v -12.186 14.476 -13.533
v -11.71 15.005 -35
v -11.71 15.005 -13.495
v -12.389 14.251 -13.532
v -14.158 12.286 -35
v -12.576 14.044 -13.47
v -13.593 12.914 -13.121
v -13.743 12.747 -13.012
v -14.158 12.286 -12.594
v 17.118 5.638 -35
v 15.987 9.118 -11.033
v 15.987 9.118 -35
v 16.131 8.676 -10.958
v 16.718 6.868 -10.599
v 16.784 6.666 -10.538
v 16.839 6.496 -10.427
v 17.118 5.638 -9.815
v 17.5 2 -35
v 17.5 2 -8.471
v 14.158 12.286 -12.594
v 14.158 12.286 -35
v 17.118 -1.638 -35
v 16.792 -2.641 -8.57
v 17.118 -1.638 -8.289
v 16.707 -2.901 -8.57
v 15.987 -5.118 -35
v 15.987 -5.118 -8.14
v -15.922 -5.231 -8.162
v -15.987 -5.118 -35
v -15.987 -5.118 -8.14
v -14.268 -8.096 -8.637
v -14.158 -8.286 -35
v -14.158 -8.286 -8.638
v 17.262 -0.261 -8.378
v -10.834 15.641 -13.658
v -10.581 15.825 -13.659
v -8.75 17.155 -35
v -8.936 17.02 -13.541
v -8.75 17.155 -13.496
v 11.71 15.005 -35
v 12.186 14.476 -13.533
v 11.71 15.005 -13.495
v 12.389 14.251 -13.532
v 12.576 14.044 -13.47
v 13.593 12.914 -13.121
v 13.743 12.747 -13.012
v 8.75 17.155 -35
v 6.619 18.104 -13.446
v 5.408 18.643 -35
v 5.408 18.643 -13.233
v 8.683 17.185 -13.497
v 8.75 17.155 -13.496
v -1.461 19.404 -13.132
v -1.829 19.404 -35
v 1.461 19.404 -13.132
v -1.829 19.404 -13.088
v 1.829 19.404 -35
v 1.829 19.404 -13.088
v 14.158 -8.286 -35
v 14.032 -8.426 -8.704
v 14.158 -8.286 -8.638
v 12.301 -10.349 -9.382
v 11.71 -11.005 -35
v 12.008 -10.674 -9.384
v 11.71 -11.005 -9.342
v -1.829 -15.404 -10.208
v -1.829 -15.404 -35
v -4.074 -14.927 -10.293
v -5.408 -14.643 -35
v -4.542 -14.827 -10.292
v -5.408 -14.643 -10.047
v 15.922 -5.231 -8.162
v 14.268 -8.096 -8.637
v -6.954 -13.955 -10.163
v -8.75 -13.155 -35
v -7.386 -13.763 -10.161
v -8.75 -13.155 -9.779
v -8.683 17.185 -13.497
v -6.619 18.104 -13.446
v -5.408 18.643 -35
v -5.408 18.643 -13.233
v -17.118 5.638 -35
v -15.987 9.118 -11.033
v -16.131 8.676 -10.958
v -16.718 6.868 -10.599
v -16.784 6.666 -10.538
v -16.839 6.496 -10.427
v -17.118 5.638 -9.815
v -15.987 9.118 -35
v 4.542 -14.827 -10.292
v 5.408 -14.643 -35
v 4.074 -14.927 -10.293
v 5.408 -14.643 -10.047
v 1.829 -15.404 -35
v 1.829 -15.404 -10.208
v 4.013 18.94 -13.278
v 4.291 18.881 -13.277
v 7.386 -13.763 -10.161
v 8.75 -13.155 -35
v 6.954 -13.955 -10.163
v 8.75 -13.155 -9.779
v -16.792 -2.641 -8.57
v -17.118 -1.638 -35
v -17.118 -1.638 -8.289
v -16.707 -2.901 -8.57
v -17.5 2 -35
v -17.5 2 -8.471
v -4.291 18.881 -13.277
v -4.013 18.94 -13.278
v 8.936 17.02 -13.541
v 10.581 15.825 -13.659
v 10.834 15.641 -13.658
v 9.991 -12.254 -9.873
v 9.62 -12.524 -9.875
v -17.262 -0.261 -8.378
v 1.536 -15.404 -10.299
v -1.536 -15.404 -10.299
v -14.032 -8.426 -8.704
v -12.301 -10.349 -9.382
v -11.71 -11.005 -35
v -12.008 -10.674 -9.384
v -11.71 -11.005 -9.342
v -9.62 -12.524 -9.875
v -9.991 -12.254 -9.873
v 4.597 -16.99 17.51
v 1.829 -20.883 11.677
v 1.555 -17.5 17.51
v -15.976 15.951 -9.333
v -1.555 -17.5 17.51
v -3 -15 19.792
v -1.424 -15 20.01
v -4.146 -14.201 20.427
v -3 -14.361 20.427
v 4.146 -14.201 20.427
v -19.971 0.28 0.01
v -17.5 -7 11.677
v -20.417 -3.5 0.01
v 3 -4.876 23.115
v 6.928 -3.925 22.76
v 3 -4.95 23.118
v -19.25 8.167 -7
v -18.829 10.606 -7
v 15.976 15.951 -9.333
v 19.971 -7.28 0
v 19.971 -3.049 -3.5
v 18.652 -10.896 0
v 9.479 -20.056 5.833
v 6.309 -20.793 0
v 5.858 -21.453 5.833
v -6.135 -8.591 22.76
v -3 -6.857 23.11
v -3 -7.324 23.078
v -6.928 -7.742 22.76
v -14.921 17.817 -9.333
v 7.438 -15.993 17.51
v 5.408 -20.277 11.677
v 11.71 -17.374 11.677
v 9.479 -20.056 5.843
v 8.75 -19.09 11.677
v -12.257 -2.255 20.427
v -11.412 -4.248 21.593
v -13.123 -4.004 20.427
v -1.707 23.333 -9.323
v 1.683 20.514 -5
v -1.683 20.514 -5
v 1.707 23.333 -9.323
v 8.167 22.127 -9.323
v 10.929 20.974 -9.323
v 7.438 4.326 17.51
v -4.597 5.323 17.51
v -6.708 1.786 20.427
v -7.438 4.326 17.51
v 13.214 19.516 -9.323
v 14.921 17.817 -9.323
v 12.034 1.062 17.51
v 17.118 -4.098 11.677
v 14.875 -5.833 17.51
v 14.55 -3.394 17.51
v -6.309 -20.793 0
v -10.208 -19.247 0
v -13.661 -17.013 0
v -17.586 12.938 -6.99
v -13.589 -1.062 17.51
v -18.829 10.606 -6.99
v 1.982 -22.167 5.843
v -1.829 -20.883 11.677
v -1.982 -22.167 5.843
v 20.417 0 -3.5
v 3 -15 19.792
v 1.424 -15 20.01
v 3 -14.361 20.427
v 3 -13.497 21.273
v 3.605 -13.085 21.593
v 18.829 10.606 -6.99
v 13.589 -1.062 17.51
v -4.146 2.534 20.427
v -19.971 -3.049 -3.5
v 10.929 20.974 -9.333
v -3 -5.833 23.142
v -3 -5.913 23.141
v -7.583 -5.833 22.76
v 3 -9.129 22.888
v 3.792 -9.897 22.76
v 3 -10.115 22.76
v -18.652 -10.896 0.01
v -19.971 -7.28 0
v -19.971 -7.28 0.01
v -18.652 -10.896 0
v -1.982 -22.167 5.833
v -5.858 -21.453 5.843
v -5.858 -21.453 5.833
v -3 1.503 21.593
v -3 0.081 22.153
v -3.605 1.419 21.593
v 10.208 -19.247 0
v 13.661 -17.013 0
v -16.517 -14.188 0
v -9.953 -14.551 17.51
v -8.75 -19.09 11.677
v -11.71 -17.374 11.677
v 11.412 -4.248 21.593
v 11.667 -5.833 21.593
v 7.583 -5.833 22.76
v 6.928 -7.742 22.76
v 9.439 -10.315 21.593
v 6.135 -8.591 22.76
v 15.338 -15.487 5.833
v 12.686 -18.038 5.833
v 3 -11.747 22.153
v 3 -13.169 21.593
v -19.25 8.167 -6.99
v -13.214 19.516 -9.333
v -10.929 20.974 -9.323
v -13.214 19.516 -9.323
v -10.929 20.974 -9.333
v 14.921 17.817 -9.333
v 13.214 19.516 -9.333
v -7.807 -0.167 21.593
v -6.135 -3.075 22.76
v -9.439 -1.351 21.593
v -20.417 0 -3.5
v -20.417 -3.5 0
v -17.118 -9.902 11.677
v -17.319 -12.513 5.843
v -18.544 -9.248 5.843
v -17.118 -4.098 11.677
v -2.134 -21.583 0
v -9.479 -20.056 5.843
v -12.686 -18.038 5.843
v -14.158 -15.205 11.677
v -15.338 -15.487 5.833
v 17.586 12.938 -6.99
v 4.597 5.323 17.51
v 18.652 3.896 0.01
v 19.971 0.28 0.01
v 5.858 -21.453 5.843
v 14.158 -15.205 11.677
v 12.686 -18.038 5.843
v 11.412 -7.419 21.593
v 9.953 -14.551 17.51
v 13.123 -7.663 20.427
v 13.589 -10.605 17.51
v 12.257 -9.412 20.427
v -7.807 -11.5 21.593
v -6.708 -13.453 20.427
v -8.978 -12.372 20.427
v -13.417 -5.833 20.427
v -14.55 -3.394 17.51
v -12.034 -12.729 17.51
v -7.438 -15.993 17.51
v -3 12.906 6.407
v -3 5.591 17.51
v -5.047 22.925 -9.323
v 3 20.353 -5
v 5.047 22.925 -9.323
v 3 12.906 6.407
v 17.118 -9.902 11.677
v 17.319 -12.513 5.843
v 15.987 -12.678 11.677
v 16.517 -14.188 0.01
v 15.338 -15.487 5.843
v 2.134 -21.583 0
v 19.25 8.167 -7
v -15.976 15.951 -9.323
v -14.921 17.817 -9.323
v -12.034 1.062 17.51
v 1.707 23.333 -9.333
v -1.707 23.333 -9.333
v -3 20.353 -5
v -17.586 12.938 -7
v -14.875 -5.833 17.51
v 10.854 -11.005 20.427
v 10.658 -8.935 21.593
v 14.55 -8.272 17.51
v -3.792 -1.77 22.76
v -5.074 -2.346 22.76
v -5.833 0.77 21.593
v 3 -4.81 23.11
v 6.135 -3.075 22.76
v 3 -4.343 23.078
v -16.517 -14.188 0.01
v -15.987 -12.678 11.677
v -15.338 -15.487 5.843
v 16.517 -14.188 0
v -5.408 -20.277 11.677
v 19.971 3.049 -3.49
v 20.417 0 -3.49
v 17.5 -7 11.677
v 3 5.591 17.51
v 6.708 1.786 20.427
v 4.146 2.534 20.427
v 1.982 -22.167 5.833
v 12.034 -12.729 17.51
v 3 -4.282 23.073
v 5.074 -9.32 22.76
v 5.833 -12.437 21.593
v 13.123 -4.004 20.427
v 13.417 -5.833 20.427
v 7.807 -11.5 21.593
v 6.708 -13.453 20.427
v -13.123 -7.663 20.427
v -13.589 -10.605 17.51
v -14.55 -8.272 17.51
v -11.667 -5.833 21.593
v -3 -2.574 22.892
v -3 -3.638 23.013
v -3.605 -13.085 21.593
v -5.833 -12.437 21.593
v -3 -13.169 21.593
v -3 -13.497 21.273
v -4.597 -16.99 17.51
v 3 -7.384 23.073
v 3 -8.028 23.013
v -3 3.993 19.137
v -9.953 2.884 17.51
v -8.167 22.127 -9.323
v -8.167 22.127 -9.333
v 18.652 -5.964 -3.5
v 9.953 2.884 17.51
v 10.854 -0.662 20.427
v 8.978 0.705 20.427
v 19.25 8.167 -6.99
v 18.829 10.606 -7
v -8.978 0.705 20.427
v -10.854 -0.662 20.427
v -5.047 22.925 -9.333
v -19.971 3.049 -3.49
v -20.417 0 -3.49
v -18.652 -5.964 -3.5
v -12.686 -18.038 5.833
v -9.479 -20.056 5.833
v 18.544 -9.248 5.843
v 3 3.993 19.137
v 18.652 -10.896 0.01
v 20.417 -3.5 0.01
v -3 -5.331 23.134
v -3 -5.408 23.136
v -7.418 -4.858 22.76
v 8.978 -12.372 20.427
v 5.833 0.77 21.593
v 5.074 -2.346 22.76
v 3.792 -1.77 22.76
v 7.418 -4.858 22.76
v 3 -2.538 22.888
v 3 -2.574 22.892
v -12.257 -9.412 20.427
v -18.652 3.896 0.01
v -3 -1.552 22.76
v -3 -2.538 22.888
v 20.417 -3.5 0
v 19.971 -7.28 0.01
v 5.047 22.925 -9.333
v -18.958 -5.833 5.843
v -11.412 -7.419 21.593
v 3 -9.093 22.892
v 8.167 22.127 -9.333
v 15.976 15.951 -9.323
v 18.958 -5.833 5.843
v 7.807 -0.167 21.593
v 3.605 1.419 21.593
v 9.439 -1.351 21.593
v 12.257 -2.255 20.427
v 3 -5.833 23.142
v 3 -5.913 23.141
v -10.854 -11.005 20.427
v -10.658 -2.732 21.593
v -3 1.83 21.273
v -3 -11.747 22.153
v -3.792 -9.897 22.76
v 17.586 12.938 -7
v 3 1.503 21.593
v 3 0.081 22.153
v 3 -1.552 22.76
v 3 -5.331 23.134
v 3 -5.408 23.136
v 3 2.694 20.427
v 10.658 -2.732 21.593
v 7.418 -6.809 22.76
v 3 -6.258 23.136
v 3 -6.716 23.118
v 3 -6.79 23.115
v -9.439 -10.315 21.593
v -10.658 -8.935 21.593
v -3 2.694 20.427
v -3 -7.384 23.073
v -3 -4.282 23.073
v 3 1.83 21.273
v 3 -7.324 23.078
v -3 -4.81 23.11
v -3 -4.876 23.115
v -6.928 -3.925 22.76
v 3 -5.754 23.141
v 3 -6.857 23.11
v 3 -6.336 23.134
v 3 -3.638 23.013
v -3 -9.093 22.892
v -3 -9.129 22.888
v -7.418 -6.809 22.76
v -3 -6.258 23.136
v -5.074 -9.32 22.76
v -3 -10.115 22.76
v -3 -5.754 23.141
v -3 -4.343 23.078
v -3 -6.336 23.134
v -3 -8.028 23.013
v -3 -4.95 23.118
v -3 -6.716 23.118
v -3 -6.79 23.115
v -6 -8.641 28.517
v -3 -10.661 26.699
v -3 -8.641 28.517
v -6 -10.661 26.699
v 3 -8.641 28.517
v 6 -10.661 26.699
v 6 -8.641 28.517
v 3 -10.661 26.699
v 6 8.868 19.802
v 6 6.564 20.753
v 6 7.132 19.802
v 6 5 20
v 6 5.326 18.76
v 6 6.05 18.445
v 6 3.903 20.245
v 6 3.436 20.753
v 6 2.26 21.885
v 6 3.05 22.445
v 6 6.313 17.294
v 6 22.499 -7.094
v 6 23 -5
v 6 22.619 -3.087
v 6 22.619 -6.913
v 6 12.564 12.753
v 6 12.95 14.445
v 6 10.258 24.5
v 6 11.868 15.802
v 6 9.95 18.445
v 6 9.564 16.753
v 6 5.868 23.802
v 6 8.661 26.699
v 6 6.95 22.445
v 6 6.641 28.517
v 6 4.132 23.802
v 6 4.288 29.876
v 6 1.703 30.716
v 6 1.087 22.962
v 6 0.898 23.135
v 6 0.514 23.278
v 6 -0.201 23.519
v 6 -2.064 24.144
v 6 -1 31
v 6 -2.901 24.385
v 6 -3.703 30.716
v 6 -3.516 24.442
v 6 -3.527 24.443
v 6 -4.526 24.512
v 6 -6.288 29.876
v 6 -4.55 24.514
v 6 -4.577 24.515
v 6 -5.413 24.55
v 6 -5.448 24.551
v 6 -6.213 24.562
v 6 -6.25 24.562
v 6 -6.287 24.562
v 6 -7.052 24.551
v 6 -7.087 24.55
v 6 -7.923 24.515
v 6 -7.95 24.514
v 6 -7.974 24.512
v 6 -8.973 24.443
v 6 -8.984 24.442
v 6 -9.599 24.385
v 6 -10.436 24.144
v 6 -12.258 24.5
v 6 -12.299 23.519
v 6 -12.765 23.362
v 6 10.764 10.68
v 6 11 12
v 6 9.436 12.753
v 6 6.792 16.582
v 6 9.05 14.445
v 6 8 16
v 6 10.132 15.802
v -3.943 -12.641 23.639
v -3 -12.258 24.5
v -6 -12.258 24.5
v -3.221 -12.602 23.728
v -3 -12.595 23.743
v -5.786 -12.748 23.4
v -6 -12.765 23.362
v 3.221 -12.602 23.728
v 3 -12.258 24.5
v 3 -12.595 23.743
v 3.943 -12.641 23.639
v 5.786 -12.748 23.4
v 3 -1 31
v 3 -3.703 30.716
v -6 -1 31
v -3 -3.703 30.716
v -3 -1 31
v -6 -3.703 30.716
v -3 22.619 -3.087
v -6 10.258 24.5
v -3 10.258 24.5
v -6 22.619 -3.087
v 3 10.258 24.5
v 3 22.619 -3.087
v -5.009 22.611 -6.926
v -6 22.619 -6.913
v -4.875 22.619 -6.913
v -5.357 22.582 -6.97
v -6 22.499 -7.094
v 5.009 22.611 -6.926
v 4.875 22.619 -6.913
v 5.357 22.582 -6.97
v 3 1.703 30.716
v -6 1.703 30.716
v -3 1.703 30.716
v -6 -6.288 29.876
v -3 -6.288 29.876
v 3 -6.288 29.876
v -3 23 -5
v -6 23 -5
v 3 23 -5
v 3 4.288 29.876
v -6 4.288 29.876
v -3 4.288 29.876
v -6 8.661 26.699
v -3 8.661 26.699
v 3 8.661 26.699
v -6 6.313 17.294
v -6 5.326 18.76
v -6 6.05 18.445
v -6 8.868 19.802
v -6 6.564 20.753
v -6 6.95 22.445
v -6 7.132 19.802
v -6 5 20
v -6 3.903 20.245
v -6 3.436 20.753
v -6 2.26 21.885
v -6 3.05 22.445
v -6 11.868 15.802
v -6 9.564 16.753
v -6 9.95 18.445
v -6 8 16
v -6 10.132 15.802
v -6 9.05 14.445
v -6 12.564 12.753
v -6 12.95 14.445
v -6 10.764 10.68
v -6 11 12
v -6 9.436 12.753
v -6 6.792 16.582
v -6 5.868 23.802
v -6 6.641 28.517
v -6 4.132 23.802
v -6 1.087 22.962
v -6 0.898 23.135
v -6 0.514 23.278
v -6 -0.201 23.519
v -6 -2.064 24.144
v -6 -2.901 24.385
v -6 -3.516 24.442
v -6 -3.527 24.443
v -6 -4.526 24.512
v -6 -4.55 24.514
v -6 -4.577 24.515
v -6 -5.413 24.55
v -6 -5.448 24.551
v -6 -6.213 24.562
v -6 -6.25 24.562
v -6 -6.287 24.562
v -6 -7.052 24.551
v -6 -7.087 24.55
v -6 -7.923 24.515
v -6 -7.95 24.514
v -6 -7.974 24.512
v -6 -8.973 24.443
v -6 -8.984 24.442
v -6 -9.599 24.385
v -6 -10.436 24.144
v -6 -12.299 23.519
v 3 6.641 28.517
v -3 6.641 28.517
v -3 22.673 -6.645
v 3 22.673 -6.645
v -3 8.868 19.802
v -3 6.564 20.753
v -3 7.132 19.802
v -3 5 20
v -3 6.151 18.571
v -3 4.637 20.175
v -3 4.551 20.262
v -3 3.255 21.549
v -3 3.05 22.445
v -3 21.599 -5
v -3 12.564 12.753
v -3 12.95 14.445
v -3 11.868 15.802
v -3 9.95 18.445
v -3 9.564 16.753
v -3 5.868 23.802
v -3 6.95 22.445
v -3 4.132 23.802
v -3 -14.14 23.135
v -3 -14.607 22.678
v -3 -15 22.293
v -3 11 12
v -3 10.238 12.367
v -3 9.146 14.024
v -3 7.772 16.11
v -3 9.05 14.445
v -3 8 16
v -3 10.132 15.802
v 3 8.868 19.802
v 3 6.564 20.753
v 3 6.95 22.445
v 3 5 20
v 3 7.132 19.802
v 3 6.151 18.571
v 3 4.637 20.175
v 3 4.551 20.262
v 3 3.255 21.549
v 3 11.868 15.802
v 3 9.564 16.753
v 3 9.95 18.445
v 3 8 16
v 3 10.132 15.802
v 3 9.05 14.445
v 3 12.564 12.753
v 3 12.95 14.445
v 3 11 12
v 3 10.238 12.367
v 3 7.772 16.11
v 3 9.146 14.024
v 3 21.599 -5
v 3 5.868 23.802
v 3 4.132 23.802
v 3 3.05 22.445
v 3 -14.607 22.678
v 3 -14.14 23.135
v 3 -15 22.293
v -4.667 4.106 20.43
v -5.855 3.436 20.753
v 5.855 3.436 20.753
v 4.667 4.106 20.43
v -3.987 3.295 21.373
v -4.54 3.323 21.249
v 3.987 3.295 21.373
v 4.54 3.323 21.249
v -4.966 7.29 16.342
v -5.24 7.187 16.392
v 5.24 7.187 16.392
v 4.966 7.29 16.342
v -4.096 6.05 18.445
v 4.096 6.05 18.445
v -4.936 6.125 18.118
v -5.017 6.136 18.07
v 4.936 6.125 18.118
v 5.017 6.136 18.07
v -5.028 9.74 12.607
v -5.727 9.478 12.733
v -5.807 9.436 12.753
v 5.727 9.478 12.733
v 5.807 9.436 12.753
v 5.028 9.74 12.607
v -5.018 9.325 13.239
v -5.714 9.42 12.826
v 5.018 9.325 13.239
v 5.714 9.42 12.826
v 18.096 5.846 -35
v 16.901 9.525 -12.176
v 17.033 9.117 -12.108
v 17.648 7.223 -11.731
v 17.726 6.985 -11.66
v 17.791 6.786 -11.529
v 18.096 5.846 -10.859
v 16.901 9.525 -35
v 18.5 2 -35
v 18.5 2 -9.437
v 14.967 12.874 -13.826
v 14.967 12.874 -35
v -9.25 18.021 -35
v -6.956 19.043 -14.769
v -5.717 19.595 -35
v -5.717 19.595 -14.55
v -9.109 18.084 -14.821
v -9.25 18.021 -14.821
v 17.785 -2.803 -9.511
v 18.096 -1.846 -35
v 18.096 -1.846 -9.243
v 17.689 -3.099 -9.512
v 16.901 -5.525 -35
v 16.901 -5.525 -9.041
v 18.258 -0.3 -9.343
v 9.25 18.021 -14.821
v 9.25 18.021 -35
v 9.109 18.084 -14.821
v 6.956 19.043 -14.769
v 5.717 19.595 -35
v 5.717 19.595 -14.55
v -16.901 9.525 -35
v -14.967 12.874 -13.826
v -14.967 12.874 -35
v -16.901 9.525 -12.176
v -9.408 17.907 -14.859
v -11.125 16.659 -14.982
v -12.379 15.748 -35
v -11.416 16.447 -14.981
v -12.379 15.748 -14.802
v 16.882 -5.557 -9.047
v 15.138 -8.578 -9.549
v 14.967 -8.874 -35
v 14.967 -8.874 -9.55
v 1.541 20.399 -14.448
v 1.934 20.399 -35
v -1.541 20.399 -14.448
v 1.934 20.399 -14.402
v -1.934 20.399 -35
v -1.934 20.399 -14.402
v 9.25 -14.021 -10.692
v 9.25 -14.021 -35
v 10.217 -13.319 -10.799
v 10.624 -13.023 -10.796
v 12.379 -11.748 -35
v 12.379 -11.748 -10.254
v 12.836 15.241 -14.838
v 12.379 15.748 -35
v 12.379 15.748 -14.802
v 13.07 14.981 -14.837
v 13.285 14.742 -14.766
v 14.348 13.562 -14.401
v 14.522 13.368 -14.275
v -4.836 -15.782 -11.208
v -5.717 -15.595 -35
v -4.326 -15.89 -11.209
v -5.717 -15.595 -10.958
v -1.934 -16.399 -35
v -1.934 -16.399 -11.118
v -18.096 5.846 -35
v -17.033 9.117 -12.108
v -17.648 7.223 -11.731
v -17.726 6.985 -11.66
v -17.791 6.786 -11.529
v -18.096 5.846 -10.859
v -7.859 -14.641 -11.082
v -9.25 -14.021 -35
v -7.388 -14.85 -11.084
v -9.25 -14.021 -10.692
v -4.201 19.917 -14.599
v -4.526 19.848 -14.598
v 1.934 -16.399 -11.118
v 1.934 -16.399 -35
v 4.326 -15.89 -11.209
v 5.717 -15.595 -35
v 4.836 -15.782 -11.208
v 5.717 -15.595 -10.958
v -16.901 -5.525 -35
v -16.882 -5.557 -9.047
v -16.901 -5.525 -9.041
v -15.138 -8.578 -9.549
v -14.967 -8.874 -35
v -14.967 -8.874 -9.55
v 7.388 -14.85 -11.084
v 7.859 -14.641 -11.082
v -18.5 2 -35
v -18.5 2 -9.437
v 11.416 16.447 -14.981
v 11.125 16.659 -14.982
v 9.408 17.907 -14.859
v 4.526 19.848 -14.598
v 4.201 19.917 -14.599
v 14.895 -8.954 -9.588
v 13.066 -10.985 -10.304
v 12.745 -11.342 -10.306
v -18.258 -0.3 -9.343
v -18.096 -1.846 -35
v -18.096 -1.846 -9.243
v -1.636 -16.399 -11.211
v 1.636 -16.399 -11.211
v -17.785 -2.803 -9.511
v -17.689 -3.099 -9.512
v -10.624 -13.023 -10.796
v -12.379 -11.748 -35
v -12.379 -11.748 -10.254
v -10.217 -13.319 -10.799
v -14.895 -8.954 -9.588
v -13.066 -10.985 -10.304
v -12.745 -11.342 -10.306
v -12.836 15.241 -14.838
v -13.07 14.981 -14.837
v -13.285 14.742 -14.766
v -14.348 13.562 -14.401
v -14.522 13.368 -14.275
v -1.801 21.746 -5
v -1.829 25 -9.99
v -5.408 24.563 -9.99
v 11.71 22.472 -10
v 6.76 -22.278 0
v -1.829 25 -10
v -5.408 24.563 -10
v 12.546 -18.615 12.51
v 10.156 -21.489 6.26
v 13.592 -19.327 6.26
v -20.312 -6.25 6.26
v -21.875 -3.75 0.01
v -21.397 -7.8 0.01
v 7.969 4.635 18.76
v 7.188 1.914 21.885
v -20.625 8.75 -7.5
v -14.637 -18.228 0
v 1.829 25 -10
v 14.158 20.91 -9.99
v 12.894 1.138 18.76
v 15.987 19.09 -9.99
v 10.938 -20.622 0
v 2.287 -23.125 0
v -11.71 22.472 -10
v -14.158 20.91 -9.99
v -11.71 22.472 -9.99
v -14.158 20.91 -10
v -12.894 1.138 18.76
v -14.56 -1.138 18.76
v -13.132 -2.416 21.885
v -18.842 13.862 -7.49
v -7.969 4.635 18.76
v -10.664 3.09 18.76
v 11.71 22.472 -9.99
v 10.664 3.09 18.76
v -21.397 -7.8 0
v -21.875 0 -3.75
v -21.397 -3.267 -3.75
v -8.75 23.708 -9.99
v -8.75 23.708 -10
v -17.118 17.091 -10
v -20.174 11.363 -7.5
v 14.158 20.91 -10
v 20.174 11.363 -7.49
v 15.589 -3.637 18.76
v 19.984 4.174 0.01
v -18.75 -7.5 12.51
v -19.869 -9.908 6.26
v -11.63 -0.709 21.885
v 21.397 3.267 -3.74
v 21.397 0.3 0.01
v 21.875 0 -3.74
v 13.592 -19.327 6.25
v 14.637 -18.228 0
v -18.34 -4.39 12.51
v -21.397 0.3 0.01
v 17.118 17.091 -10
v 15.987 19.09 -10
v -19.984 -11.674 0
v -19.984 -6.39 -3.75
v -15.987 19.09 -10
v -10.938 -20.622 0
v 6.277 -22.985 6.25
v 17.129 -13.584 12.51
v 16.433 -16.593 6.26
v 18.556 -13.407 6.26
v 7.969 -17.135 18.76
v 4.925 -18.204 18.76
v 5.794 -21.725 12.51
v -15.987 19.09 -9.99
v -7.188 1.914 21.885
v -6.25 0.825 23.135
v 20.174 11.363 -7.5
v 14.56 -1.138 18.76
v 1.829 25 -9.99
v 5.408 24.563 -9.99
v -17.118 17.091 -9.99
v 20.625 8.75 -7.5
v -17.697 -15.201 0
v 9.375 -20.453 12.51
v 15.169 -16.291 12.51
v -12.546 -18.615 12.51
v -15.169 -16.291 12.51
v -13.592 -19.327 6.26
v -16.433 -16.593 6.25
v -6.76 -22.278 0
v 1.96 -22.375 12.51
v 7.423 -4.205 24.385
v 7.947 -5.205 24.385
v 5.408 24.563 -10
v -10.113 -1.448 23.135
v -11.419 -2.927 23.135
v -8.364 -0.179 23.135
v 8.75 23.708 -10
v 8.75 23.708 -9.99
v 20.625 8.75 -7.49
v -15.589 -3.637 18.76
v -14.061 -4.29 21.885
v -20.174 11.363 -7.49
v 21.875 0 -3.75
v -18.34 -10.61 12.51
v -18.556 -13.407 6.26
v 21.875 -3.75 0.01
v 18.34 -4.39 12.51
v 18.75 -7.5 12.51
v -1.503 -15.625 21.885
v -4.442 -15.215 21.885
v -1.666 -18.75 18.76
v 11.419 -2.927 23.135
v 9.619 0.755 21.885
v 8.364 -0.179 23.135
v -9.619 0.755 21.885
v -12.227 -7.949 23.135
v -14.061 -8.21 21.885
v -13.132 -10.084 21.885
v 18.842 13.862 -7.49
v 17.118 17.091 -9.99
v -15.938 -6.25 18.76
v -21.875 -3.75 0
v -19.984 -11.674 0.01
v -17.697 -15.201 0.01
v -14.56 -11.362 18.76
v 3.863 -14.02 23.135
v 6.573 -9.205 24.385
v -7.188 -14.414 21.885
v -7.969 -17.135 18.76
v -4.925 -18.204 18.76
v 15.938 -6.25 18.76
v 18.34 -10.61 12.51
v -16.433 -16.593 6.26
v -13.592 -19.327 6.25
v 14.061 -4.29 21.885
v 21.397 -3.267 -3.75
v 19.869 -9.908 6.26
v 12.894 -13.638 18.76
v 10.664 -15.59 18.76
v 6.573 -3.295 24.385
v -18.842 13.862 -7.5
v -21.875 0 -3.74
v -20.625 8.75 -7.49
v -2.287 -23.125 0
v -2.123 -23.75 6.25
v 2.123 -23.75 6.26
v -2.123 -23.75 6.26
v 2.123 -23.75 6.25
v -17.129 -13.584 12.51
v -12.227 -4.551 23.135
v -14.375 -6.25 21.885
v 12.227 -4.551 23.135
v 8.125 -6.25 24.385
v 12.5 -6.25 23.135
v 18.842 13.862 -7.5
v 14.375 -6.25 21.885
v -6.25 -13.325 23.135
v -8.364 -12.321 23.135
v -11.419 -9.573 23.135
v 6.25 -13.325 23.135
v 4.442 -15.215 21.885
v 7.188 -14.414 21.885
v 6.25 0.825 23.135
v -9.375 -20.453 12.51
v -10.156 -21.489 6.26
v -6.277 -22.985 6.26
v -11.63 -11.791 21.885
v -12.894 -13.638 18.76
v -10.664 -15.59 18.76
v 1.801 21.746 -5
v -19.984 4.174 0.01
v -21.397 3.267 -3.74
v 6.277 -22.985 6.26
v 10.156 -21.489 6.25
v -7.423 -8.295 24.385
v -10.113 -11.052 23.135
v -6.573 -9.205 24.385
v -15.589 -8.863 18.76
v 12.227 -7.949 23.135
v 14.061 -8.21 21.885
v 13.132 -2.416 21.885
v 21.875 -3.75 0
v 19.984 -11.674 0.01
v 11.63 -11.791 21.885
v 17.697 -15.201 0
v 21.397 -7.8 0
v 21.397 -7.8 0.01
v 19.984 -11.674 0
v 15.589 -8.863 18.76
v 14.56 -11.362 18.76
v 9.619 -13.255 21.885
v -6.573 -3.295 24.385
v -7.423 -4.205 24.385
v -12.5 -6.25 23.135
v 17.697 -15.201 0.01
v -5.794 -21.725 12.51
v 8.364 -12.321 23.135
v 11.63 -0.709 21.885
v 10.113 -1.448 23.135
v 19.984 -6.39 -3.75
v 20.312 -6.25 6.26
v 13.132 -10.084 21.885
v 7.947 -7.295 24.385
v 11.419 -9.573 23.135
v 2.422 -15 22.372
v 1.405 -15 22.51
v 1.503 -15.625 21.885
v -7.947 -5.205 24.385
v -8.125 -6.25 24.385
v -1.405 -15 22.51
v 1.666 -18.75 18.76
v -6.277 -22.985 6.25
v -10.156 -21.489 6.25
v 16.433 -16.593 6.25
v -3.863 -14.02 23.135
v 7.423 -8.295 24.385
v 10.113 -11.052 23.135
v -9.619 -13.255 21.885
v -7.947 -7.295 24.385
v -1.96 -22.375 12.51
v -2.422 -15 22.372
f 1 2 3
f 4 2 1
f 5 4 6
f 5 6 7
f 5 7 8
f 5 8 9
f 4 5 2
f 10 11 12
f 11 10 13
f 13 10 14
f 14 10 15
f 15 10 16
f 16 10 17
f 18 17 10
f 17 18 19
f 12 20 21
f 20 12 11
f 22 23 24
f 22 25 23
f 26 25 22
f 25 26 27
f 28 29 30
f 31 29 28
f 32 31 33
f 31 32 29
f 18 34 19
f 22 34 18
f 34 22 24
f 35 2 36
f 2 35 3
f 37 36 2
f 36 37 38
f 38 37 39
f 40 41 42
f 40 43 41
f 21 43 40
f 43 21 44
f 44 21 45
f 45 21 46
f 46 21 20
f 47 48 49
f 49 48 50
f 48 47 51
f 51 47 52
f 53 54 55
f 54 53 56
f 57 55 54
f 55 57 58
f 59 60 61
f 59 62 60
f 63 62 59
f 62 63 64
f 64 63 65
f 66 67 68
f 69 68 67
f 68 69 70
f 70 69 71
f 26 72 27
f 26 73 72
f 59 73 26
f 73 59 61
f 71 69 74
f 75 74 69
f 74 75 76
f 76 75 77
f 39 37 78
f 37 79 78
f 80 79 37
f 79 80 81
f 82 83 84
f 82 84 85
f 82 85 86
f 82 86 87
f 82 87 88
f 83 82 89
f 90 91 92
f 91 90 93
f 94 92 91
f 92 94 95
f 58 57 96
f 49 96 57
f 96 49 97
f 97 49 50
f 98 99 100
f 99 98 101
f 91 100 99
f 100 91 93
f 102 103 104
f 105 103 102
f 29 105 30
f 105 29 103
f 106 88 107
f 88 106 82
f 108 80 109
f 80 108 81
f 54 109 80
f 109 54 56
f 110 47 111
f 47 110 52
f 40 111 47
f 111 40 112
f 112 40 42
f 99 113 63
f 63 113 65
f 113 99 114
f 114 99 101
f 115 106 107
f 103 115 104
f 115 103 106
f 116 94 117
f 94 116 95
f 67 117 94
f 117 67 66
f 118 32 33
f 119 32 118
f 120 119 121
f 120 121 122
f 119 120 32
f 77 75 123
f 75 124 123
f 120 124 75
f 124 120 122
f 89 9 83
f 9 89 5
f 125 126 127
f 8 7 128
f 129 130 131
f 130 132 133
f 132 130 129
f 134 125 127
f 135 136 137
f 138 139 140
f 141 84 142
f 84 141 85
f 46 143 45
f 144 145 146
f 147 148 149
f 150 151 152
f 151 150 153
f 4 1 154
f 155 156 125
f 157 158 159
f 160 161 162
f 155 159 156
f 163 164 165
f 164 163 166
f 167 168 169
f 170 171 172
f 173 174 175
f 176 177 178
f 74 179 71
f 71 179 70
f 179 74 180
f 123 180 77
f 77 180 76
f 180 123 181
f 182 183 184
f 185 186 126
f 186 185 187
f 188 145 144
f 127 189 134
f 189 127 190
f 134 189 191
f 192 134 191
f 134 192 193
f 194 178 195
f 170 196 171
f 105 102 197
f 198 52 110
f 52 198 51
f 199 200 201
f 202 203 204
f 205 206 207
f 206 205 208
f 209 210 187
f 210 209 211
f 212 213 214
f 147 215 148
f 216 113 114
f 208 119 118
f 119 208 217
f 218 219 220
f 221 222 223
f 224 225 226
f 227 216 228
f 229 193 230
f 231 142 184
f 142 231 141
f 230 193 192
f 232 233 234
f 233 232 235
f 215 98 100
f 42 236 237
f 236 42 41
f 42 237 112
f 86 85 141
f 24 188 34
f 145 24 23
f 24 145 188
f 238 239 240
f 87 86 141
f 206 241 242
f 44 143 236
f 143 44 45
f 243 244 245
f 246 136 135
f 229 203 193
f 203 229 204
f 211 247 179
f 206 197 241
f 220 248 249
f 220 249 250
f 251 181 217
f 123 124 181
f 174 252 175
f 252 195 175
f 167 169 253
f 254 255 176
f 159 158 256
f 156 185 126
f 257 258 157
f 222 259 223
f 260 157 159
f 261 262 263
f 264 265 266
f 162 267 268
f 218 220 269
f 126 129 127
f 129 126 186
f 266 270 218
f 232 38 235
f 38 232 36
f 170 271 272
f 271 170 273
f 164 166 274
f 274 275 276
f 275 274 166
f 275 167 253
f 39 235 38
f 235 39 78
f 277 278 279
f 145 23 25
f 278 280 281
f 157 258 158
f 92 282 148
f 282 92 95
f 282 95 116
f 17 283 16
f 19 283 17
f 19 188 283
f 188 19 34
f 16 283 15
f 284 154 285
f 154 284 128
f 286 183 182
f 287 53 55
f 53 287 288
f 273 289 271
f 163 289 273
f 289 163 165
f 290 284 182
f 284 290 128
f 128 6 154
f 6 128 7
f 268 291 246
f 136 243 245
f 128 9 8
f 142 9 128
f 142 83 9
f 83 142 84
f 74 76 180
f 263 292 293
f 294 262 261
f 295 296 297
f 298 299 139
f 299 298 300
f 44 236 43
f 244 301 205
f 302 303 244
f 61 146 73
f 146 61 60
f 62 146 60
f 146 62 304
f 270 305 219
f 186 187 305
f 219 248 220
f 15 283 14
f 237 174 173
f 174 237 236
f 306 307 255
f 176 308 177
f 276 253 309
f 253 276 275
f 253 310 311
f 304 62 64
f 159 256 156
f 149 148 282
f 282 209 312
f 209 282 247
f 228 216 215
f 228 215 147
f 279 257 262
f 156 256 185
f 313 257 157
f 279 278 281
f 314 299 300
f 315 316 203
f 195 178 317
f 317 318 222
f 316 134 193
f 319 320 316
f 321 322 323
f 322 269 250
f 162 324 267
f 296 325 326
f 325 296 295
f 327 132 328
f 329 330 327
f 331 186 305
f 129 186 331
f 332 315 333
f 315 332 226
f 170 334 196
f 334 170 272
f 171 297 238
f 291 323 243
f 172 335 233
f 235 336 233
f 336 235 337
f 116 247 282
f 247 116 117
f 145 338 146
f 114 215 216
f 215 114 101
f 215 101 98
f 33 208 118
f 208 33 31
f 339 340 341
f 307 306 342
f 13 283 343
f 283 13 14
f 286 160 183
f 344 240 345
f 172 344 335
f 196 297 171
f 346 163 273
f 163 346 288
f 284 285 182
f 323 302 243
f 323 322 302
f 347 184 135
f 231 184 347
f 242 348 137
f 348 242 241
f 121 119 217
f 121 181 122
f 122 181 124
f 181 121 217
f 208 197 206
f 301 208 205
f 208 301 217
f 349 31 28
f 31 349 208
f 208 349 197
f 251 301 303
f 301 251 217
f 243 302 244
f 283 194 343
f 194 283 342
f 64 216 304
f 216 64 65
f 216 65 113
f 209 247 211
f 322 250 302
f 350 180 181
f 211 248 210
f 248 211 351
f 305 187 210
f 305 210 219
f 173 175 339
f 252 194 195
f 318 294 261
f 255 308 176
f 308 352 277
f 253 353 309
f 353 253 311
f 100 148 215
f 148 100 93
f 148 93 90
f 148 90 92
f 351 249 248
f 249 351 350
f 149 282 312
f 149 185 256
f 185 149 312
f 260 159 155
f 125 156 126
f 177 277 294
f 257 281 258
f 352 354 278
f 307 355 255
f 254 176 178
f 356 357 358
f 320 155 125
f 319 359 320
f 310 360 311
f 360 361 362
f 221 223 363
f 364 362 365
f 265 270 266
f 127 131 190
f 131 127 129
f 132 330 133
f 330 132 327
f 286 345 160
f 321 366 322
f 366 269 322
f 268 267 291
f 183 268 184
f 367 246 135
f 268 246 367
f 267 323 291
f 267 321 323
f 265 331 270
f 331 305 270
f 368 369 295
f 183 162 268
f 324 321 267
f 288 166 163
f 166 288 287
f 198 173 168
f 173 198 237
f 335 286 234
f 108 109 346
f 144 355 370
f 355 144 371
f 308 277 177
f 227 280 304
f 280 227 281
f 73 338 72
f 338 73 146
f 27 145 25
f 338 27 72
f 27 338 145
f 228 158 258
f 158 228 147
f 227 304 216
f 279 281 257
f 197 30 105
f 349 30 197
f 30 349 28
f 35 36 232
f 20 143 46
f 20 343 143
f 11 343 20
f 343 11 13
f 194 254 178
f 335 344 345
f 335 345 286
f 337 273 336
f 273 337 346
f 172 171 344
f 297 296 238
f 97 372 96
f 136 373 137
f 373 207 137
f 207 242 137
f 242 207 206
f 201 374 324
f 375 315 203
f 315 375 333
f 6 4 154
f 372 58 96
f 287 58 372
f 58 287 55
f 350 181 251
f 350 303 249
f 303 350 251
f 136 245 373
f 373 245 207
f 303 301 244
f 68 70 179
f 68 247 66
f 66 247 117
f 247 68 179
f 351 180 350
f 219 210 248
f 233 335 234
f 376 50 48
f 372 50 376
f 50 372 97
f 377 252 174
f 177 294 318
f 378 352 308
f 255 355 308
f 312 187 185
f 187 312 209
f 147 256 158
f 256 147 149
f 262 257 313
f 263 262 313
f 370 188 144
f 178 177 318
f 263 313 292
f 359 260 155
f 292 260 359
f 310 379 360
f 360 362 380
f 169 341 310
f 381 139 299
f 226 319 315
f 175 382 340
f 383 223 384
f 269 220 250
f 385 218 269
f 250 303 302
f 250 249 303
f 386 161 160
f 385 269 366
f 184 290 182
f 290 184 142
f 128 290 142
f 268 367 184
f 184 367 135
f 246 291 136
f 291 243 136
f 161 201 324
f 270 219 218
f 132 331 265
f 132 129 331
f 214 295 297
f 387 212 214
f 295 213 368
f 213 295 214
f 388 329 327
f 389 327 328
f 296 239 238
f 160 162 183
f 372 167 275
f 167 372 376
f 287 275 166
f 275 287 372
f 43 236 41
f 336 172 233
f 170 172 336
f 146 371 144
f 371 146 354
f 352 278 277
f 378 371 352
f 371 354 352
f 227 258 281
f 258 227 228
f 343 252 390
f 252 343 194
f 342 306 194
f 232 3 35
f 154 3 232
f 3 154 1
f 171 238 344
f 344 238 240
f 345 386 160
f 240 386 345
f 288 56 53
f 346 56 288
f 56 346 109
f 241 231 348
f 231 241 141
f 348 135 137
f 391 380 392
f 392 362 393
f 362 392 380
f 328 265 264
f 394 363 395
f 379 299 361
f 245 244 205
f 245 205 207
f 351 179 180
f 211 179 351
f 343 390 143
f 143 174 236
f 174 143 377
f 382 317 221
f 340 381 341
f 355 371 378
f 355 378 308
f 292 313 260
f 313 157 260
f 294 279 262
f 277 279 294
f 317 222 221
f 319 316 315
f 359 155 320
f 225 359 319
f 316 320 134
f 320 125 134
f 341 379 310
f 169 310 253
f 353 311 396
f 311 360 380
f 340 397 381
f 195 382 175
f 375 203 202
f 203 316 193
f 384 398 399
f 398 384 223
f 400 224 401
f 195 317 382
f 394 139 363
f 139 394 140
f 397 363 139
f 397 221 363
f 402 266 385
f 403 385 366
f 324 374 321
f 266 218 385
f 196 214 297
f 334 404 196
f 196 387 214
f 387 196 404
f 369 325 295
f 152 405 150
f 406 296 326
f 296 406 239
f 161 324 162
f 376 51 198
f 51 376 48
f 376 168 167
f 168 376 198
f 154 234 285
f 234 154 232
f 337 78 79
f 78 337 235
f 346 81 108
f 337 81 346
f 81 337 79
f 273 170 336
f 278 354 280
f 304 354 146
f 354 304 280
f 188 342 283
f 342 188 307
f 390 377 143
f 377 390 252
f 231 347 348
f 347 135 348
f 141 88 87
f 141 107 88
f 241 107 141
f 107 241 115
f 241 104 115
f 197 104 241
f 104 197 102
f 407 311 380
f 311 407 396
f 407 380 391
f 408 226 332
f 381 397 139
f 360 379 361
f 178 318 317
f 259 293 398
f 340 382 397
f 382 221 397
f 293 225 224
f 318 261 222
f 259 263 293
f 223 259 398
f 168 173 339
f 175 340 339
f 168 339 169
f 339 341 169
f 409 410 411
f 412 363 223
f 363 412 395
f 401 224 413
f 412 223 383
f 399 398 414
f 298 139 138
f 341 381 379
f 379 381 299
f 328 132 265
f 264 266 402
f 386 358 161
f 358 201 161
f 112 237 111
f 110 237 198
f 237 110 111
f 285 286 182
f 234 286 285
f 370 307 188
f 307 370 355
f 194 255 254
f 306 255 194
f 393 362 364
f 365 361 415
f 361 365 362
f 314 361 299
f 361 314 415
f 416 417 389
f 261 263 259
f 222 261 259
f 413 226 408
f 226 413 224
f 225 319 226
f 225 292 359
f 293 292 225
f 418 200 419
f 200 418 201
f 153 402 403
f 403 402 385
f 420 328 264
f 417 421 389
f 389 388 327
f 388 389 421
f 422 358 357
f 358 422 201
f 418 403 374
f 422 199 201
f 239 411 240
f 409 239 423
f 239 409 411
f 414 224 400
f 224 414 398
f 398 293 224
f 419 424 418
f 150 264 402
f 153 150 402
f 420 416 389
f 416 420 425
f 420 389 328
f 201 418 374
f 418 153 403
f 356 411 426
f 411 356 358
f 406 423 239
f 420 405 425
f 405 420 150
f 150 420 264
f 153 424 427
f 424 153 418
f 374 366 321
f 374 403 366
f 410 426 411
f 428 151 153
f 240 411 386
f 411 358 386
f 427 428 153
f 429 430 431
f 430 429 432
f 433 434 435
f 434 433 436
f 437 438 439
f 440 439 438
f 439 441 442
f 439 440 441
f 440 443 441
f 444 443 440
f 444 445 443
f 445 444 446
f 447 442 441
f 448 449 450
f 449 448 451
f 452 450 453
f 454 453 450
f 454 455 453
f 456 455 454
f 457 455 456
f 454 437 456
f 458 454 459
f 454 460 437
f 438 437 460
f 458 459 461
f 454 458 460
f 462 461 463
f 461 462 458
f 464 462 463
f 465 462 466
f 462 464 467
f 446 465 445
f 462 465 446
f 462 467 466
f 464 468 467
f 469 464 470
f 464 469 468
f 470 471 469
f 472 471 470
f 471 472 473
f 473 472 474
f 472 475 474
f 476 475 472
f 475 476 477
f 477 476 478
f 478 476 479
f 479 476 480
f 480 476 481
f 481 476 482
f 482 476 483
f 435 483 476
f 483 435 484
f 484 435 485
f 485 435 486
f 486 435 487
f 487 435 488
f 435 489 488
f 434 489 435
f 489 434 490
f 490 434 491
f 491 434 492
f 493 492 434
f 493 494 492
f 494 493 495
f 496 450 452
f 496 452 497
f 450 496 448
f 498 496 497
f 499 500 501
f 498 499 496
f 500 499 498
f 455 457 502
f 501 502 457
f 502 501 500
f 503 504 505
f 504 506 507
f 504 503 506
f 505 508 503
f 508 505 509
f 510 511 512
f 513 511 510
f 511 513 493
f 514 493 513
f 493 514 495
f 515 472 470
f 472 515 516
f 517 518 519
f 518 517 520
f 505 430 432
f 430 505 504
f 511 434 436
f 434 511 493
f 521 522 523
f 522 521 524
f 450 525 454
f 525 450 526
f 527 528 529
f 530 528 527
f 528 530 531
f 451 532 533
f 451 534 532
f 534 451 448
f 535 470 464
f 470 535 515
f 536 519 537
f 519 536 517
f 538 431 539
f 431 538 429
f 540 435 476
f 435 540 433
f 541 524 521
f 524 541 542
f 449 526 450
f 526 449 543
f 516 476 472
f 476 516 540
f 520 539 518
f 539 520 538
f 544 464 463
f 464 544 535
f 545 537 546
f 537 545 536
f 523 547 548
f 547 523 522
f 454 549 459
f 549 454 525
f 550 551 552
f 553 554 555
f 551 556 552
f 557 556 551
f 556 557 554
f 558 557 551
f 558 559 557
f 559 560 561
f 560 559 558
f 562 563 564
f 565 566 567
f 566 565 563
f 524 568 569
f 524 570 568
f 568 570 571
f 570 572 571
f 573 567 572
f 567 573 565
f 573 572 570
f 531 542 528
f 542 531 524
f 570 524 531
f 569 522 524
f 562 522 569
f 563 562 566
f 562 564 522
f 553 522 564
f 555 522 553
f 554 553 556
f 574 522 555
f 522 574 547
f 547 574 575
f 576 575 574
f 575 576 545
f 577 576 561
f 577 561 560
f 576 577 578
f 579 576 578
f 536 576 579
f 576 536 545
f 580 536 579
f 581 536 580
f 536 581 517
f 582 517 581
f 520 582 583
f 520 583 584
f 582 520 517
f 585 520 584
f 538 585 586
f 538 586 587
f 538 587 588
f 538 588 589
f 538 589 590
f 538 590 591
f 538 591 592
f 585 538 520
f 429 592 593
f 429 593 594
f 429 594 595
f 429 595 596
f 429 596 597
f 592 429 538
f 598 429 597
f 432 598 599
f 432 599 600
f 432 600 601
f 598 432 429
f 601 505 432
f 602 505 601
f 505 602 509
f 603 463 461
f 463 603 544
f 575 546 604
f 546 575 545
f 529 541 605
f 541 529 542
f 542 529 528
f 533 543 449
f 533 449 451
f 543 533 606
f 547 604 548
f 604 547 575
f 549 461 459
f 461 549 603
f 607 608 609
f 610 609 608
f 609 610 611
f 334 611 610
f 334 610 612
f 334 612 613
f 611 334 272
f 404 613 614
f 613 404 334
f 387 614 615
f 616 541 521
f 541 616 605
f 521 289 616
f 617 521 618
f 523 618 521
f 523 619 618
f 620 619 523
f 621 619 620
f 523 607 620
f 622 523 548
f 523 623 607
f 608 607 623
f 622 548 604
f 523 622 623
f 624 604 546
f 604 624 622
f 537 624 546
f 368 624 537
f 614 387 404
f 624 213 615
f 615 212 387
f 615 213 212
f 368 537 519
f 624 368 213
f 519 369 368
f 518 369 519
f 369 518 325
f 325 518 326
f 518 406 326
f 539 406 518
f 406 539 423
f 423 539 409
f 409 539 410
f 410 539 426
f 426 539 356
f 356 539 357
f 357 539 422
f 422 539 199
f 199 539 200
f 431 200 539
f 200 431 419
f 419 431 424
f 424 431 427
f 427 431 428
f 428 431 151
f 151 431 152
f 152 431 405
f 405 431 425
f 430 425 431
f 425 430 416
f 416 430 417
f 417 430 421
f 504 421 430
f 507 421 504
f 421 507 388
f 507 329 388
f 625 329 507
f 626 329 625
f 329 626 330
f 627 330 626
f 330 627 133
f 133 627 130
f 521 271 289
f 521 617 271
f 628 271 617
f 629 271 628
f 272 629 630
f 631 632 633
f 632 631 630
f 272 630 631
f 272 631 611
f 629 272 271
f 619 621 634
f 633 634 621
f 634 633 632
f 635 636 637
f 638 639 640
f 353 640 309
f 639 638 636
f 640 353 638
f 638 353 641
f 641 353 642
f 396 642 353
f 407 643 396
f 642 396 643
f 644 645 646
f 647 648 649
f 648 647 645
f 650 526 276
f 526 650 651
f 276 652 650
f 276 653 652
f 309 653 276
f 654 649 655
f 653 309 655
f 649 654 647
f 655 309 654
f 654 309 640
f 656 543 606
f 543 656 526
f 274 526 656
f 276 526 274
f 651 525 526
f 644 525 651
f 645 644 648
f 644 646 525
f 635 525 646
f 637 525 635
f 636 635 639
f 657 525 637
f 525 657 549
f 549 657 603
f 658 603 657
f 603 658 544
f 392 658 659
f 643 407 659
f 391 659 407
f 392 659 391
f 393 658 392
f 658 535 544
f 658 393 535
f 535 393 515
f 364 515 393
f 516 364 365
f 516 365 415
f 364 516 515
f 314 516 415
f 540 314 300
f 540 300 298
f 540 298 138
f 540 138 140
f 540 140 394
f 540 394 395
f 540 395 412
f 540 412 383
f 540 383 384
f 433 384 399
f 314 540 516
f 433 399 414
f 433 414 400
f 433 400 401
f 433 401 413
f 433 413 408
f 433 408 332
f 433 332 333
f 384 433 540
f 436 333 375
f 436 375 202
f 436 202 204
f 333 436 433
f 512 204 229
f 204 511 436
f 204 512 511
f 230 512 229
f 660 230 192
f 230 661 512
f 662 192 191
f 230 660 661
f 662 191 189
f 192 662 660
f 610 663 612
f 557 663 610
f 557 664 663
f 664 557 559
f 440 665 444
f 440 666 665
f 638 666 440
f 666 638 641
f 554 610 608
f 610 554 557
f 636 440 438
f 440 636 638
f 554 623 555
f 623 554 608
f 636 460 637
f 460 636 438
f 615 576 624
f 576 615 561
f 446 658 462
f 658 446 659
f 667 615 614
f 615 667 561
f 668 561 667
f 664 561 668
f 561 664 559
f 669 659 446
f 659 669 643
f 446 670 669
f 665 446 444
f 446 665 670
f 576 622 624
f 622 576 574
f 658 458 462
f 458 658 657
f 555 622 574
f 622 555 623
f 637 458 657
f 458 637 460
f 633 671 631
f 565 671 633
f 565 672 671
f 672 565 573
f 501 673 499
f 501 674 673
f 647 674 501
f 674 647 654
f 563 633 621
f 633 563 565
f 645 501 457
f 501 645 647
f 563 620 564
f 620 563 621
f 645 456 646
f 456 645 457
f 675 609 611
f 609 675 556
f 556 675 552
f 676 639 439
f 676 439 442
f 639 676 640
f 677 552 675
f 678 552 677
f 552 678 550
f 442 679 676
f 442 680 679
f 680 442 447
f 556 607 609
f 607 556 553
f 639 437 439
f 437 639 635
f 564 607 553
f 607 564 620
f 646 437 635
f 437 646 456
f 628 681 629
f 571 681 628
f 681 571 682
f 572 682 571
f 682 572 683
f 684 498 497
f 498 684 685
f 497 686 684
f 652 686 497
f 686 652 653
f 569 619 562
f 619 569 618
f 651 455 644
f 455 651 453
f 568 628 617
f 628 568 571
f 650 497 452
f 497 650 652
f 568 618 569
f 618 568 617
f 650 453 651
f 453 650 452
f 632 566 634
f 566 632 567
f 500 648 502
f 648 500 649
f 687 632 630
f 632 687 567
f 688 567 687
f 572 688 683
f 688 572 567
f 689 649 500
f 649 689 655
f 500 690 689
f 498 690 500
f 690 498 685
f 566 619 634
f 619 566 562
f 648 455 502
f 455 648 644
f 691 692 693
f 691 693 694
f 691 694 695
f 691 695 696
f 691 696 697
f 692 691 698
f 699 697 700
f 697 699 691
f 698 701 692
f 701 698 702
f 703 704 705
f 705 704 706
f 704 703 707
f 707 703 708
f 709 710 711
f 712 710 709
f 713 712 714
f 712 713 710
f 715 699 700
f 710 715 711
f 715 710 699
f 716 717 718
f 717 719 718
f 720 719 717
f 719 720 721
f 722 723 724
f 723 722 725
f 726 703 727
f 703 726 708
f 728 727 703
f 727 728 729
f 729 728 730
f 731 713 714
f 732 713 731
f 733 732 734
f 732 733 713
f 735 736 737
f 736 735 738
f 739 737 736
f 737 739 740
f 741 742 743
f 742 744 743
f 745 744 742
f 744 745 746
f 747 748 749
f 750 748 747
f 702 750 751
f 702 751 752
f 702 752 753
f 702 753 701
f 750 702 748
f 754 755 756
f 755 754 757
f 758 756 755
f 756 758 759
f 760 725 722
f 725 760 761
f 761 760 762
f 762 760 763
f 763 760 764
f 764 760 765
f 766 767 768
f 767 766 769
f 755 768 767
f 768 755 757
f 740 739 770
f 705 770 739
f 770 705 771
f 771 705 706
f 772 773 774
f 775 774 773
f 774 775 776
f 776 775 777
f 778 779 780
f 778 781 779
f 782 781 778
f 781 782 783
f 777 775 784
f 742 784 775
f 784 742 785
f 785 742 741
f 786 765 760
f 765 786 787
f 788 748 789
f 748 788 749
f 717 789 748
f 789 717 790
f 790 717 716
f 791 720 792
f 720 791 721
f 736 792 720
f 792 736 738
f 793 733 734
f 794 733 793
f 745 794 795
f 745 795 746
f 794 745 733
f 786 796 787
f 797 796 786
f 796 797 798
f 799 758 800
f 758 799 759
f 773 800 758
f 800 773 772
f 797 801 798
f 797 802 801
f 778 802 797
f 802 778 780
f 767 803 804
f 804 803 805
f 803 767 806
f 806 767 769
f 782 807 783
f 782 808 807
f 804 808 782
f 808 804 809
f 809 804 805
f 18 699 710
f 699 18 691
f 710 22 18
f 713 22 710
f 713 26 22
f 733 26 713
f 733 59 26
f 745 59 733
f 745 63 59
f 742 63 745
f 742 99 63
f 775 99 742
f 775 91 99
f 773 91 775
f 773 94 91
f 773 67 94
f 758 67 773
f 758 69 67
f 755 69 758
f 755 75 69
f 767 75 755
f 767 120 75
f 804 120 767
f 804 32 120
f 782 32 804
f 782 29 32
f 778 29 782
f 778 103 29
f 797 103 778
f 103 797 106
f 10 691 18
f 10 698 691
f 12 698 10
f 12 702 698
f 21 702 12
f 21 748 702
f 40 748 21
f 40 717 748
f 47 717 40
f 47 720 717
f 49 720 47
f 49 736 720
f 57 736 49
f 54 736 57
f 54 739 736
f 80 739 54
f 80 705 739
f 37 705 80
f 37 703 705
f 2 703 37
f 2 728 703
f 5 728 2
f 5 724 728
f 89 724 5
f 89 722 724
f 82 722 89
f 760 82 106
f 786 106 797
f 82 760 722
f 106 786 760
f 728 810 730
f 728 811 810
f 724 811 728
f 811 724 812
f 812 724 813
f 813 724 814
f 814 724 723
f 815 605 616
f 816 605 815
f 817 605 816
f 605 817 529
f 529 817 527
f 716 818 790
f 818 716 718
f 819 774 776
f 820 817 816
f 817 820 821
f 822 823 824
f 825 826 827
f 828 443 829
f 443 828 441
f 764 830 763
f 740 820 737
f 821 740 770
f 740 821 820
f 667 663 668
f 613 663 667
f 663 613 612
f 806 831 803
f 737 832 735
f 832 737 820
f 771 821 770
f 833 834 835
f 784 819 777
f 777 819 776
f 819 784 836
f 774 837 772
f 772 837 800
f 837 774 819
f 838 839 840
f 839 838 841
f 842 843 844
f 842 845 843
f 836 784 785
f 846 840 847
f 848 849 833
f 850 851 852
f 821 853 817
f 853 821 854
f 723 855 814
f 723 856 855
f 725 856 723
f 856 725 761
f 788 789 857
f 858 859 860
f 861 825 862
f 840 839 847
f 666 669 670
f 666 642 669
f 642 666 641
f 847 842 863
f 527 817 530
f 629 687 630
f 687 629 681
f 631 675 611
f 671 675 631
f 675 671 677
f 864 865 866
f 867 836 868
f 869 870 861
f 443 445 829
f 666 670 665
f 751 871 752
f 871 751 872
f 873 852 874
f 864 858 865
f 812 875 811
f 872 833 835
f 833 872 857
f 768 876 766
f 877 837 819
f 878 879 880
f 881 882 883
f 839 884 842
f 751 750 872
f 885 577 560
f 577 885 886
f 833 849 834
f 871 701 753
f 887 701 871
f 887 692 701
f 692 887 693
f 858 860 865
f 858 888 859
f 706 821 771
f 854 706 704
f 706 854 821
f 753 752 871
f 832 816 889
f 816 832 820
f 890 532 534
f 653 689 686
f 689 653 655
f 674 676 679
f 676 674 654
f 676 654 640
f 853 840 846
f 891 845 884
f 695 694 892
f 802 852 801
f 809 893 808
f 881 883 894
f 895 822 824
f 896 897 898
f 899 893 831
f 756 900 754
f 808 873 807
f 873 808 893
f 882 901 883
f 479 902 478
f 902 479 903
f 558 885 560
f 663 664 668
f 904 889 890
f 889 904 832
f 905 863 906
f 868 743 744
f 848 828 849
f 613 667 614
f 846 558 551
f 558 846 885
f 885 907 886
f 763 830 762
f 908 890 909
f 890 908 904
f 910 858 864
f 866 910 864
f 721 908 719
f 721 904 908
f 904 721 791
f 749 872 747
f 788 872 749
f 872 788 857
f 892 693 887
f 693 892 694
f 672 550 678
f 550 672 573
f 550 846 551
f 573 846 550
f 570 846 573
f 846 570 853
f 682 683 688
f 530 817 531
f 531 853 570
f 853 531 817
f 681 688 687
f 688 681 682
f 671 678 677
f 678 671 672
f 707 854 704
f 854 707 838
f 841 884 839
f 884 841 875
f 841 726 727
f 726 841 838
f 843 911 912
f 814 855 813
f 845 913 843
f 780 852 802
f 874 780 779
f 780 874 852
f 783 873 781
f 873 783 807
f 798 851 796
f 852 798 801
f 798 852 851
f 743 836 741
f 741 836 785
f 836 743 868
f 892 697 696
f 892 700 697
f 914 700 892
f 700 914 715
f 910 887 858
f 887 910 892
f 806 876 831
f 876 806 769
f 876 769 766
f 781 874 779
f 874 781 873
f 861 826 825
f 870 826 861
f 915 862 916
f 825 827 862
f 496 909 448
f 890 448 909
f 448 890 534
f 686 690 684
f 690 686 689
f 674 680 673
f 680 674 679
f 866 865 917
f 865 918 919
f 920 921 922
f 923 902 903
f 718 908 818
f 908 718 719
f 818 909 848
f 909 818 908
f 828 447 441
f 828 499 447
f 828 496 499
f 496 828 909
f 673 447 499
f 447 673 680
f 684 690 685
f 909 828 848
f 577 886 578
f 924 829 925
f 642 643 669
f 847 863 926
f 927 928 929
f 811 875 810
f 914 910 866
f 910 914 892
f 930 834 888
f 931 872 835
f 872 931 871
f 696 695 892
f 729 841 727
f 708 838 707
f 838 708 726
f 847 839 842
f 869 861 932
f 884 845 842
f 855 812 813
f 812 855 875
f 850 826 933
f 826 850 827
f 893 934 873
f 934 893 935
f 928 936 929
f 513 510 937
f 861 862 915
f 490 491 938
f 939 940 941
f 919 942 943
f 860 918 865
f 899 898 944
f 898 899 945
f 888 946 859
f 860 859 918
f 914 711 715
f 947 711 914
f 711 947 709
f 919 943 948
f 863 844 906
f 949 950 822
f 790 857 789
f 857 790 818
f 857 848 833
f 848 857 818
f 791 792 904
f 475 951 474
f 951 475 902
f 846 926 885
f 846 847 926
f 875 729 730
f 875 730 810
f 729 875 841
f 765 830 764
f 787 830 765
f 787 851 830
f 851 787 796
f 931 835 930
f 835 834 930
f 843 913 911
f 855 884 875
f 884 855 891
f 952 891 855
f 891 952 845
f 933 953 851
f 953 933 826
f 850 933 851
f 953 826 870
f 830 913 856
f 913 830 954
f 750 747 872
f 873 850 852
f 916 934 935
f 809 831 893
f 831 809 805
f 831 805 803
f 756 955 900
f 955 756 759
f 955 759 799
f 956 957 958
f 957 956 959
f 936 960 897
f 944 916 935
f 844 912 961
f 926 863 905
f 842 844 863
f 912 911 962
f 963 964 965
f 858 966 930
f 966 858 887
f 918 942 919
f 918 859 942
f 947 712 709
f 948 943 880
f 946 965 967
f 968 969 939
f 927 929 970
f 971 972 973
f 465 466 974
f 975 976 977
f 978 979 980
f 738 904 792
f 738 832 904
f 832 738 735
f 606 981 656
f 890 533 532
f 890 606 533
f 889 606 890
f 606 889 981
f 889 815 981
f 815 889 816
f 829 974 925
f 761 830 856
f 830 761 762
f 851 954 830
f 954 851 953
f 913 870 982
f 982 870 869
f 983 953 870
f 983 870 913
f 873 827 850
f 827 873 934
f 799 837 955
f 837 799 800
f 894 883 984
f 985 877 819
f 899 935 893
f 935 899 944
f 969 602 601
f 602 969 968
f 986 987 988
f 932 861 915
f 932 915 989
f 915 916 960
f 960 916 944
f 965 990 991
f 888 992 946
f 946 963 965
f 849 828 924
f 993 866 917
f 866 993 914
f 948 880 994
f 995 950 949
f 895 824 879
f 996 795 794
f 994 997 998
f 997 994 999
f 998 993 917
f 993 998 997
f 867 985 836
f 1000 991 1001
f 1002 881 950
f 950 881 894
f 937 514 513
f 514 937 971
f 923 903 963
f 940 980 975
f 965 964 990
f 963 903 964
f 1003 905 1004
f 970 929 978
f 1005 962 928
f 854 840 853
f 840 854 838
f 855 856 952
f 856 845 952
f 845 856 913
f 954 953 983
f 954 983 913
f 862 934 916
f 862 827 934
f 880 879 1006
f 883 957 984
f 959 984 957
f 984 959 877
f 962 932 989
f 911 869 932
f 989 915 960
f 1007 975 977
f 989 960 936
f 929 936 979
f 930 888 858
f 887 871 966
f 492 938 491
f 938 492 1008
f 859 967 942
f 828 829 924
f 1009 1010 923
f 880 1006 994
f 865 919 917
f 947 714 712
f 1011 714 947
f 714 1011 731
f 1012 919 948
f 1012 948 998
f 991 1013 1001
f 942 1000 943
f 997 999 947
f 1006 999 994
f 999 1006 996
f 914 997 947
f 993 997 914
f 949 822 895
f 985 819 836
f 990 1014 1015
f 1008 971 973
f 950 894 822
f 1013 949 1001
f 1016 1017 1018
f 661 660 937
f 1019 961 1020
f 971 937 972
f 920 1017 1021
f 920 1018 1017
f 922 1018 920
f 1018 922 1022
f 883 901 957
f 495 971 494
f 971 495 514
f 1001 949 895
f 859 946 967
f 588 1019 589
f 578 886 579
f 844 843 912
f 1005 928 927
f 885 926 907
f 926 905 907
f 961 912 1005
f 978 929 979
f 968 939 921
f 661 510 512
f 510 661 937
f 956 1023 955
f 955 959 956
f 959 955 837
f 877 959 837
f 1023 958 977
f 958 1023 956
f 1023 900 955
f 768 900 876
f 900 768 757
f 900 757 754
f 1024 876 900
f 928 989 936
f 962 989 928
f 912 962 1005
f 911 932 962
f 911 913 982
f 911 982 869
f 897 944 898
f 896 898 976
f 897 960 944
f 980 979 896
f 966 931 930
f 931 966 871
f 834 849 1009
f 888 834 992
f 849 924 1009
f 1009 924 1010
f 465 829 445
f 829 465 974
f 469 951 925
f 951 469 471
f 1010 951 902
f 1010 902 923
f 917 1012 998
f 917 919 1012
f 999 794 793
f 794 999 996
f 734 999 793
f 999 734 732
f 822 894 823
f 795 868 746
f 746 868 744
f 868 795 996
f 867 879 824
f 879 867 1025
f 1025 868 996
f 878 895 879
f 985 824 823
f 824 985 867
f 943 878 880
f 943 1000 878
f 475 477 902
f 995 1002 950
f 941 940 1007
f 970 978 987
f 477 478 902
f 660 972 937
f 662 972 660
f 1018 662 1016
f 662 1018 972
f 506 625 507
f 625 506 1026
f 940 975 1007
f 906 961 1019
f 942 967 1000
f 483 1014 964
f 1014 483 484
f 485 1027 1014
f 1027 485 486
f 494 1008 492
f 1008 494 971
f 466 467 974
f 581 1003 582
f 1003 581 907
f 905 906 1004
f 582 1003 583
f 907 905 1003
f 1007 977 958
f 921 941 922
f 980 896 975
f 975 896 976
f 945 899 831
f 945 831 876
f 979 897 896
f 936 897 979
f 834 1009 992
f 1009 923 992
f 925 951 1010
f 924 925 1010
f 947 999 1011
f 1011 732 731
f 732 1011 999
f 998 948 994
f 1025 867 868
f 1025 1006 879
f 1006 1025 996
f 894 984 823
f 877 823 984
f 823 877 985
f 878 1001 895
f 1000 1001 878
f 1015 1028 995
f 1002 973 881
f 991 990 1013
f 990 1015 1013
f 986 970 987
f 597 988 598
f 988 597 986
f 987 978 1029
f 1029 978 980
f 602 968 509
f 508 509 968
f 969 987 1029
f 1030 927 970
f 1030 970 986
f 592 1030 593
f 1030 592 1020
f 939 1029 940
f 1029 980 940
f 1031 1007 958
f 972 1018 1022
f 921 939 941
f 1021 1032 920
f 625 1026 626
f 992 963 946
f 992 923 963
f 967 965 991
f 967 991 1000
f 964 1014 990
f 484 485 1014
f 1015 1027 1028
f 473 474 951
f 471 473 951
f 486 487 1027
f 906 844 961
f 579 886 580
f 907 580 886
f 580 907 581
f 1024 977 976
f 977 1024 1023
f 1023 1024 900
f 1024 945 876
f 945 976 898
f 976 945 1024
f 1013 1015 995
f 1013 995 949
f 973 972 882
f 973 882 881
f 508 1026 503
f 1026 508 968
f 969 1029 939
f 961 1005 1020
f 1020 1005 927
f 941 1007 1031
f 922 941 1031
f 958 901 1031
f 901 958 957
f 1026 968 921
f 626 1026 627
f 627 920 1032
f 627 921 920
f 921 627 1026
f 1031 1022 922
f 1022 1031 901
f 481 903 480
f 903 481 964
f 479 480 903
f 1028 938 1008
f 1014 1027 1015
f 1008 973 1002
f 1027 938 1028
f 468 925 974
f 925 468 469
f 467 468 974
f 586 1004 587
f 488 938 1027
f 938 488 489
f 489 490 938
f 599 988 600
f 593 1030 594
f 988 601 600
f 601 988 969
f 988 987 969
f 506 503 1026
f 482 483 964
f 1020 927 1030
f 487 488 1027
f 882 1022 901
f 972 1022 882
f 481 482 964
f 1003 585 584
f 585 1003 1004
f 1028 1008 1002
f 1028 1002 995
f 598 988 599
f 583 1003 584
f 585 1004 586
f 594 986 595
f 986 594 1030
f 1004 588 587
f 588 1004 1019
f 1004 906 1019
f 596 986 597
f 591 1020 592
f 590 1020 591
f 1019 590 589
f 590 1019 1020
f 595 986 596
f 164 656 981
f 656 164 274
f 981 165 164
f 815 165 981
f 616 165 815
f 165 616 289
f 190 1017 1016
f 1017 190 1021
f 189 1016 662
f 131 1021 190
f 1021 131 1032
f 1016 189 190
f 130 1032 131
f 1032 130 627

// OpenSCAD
// fl sh 32.5 x 32.5 head 3.75 x 3.25
glansData = [ // yShift, z, x, y
[0, -22.5, 10 , 10],
[12, -8, 28 , 16],
[7, -6, 33 , 20],
[0, -3, 35 , 25],
[-3, 0, 35 , 31],
[-5, 5, 32.5 , 28],
[-6, 10, 30 , 23.8],
[-5, 15, 25.5 , 20],
[-5, 17.5, 23 , 15],
[-5, 18.5, 20 , 13],
[-5, 19.5, 13 , 8],
[-5, 20, 1 , 1],
];

module positionedOval(px, py, pz, lx, ly){
    translate([px, py, pz])
        resize([lx, ly]) cylinder(d=20, h=0.01);
}


module glans(gd, gf){// gf x, y , z
    hull(){
        for( i=[0 : len(gd) -1])
            positionedOval(0, gd[i][0] * gf[1], gd[i][1] * gf[2], gd[i][2] * gf[0] , gd[i][3] * gf[1]);   
    } 
}

module shaft(lengte, dikte){
    translate([0, 2, 0]){
        difference() { 
            translate([0, 0, -lengte])
                cylinder(h = lengte, d = dikte);
            translate([0, 23, 10])
                rotate([45, 0, 0])
                    cube(40,center = true);
        }
    }
}

module binnenHolte(glansData, glansFactor, lengte, dikte){
    glans(glansData, glansFactor);
    shaft(lengte, dikte);
}

module hollePik(){
    difference(){
        binnenHolte(glansData, [15/12,15/12,15/12], lengte = 35, dikte = 37);
        binnenHolte(glansData, [7/6, 7/6, 7/6], lengte = 45, dikte = 35);    
    }
}

difference(){
    hull(){
        translate([0, -1,18])
            rotate([0,90,0])
                cylinder(h=12, r=13, center=true);        
        translate([0, 18,-5])
            rotate([0,90,0])
                cylinder(h=12, r=5, center=true);
    }
    rotate([0,90,0])
        cylinder(h=6, r=120, center=true);
    binnenHolte(glansData, [7/6, 7/6, 7/6], lengte = 45, dikte = 35);
    translate([0, 5,22])
        rotate([0,90,0])
            cylinder(h=20, r=2, center=true);
    translate([0, 8,18])
        rotate([0,90,0])
            cylinder(h=20, r=2, center=true);
    translate([0, 11,14])
        rotate([0,90,0])
            cylinder(h=20, r=2, center=true);
}

difference(){
    hollePik();    
    translate([0,10,20])
        cube([6, 50, 50], center = true);
}
//binnenHolte(glansData, [1,1,1], lengte = 35, dikte = 30);
